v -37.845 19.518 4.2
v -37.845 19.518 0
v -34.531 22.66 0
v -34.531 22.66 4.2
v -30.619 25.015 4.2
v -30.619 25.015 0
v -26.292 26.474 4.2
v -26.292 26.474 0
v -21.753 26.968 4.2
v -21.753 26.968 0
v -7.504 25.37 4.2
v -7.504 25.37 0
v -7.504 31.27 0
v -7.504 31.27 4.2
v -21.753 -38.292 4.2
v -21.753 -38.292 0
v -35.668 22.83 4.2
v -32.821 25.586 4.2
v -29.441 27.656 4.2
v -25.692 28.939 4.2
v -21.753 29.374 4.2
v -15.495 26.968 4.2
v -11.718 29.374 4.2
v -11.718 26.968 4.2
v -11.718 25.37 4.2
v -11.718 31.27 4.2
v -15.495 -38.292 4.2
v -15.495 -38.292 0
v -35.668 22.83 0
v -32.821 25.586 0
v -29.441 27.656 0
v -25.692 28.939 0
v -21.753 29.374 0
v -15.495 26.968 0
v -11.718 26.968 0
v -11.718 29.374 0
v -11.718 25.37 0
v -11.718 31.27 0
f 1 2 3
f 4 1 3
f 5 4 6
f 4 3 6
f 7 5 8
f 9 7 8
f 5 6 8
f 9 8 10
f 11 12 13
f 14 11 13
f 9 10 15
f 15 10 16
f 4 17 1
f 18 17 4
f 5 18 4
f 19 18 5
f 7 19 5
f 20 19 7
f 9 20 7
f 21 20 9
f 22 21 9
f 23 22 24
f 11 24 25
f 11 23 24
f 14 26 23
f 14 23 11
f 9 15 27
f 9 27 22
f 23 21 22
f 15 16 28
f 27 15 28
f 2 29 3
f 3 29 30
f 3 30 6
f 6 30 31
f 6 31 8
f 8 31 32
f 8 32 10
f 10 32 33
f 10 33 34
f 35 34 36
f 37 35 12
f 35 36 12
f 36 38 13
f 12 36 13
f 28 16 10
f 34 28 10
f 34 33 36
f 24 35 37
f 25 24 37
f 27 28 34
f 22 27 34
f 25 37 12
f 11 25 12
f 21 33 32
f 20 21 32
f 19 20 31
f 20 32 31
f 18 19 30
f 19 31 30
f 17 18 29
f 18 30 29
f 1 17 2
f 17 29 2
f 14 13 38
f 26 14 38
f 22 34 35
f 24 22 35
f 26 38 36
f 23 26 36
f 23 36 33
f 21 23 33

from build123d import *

# Parameters (mm, degrees)
F1_DEPTH = 4.2


with BuildPart() as f1:
    # F0 (on Top) → F1 (new body)
    with BuildSketch(Plane.XY):
        with BuildLine():
            Line((-21.753184, 26.967989), (-21.753184, -38.291566))
            Line((-21.753184, -38.291566), (-15.49542, -38.291566))
            Line((-15.49542, -38.291566), (-15.49542, 26.967989))
            Line((-15.49542, 26.967989), (-11.718347, 26.967989))
            Line((-11.718347, 26.967989), (-11.718347, 25.370423))
            Line((-11.718347, 25.370423), (-7.504017, 25.370423))
            Line((-7.504017, 25.370423), (-7.504017, 31.270303))
            Line((-7.504017, 31.270303), (-11.718347, 31.270303))
            Line((-11.718347, 31.270303), (-11.718347, 29.373912))
            Line((-11.718347, 29.373912), (-21.753184, 29.373912))
            ThreePointArc((-21.753184, 29.373912), (-31.188051, 26.714196), (-37.844583, 19.518269))
            ThreePointArc((-37.844583, 19.518269), (-30.619292, 25.015211), (-21.753184, 26.967989))
        make_face()
    extrude(amount=F1_DEPTH)


solid = f1.part
